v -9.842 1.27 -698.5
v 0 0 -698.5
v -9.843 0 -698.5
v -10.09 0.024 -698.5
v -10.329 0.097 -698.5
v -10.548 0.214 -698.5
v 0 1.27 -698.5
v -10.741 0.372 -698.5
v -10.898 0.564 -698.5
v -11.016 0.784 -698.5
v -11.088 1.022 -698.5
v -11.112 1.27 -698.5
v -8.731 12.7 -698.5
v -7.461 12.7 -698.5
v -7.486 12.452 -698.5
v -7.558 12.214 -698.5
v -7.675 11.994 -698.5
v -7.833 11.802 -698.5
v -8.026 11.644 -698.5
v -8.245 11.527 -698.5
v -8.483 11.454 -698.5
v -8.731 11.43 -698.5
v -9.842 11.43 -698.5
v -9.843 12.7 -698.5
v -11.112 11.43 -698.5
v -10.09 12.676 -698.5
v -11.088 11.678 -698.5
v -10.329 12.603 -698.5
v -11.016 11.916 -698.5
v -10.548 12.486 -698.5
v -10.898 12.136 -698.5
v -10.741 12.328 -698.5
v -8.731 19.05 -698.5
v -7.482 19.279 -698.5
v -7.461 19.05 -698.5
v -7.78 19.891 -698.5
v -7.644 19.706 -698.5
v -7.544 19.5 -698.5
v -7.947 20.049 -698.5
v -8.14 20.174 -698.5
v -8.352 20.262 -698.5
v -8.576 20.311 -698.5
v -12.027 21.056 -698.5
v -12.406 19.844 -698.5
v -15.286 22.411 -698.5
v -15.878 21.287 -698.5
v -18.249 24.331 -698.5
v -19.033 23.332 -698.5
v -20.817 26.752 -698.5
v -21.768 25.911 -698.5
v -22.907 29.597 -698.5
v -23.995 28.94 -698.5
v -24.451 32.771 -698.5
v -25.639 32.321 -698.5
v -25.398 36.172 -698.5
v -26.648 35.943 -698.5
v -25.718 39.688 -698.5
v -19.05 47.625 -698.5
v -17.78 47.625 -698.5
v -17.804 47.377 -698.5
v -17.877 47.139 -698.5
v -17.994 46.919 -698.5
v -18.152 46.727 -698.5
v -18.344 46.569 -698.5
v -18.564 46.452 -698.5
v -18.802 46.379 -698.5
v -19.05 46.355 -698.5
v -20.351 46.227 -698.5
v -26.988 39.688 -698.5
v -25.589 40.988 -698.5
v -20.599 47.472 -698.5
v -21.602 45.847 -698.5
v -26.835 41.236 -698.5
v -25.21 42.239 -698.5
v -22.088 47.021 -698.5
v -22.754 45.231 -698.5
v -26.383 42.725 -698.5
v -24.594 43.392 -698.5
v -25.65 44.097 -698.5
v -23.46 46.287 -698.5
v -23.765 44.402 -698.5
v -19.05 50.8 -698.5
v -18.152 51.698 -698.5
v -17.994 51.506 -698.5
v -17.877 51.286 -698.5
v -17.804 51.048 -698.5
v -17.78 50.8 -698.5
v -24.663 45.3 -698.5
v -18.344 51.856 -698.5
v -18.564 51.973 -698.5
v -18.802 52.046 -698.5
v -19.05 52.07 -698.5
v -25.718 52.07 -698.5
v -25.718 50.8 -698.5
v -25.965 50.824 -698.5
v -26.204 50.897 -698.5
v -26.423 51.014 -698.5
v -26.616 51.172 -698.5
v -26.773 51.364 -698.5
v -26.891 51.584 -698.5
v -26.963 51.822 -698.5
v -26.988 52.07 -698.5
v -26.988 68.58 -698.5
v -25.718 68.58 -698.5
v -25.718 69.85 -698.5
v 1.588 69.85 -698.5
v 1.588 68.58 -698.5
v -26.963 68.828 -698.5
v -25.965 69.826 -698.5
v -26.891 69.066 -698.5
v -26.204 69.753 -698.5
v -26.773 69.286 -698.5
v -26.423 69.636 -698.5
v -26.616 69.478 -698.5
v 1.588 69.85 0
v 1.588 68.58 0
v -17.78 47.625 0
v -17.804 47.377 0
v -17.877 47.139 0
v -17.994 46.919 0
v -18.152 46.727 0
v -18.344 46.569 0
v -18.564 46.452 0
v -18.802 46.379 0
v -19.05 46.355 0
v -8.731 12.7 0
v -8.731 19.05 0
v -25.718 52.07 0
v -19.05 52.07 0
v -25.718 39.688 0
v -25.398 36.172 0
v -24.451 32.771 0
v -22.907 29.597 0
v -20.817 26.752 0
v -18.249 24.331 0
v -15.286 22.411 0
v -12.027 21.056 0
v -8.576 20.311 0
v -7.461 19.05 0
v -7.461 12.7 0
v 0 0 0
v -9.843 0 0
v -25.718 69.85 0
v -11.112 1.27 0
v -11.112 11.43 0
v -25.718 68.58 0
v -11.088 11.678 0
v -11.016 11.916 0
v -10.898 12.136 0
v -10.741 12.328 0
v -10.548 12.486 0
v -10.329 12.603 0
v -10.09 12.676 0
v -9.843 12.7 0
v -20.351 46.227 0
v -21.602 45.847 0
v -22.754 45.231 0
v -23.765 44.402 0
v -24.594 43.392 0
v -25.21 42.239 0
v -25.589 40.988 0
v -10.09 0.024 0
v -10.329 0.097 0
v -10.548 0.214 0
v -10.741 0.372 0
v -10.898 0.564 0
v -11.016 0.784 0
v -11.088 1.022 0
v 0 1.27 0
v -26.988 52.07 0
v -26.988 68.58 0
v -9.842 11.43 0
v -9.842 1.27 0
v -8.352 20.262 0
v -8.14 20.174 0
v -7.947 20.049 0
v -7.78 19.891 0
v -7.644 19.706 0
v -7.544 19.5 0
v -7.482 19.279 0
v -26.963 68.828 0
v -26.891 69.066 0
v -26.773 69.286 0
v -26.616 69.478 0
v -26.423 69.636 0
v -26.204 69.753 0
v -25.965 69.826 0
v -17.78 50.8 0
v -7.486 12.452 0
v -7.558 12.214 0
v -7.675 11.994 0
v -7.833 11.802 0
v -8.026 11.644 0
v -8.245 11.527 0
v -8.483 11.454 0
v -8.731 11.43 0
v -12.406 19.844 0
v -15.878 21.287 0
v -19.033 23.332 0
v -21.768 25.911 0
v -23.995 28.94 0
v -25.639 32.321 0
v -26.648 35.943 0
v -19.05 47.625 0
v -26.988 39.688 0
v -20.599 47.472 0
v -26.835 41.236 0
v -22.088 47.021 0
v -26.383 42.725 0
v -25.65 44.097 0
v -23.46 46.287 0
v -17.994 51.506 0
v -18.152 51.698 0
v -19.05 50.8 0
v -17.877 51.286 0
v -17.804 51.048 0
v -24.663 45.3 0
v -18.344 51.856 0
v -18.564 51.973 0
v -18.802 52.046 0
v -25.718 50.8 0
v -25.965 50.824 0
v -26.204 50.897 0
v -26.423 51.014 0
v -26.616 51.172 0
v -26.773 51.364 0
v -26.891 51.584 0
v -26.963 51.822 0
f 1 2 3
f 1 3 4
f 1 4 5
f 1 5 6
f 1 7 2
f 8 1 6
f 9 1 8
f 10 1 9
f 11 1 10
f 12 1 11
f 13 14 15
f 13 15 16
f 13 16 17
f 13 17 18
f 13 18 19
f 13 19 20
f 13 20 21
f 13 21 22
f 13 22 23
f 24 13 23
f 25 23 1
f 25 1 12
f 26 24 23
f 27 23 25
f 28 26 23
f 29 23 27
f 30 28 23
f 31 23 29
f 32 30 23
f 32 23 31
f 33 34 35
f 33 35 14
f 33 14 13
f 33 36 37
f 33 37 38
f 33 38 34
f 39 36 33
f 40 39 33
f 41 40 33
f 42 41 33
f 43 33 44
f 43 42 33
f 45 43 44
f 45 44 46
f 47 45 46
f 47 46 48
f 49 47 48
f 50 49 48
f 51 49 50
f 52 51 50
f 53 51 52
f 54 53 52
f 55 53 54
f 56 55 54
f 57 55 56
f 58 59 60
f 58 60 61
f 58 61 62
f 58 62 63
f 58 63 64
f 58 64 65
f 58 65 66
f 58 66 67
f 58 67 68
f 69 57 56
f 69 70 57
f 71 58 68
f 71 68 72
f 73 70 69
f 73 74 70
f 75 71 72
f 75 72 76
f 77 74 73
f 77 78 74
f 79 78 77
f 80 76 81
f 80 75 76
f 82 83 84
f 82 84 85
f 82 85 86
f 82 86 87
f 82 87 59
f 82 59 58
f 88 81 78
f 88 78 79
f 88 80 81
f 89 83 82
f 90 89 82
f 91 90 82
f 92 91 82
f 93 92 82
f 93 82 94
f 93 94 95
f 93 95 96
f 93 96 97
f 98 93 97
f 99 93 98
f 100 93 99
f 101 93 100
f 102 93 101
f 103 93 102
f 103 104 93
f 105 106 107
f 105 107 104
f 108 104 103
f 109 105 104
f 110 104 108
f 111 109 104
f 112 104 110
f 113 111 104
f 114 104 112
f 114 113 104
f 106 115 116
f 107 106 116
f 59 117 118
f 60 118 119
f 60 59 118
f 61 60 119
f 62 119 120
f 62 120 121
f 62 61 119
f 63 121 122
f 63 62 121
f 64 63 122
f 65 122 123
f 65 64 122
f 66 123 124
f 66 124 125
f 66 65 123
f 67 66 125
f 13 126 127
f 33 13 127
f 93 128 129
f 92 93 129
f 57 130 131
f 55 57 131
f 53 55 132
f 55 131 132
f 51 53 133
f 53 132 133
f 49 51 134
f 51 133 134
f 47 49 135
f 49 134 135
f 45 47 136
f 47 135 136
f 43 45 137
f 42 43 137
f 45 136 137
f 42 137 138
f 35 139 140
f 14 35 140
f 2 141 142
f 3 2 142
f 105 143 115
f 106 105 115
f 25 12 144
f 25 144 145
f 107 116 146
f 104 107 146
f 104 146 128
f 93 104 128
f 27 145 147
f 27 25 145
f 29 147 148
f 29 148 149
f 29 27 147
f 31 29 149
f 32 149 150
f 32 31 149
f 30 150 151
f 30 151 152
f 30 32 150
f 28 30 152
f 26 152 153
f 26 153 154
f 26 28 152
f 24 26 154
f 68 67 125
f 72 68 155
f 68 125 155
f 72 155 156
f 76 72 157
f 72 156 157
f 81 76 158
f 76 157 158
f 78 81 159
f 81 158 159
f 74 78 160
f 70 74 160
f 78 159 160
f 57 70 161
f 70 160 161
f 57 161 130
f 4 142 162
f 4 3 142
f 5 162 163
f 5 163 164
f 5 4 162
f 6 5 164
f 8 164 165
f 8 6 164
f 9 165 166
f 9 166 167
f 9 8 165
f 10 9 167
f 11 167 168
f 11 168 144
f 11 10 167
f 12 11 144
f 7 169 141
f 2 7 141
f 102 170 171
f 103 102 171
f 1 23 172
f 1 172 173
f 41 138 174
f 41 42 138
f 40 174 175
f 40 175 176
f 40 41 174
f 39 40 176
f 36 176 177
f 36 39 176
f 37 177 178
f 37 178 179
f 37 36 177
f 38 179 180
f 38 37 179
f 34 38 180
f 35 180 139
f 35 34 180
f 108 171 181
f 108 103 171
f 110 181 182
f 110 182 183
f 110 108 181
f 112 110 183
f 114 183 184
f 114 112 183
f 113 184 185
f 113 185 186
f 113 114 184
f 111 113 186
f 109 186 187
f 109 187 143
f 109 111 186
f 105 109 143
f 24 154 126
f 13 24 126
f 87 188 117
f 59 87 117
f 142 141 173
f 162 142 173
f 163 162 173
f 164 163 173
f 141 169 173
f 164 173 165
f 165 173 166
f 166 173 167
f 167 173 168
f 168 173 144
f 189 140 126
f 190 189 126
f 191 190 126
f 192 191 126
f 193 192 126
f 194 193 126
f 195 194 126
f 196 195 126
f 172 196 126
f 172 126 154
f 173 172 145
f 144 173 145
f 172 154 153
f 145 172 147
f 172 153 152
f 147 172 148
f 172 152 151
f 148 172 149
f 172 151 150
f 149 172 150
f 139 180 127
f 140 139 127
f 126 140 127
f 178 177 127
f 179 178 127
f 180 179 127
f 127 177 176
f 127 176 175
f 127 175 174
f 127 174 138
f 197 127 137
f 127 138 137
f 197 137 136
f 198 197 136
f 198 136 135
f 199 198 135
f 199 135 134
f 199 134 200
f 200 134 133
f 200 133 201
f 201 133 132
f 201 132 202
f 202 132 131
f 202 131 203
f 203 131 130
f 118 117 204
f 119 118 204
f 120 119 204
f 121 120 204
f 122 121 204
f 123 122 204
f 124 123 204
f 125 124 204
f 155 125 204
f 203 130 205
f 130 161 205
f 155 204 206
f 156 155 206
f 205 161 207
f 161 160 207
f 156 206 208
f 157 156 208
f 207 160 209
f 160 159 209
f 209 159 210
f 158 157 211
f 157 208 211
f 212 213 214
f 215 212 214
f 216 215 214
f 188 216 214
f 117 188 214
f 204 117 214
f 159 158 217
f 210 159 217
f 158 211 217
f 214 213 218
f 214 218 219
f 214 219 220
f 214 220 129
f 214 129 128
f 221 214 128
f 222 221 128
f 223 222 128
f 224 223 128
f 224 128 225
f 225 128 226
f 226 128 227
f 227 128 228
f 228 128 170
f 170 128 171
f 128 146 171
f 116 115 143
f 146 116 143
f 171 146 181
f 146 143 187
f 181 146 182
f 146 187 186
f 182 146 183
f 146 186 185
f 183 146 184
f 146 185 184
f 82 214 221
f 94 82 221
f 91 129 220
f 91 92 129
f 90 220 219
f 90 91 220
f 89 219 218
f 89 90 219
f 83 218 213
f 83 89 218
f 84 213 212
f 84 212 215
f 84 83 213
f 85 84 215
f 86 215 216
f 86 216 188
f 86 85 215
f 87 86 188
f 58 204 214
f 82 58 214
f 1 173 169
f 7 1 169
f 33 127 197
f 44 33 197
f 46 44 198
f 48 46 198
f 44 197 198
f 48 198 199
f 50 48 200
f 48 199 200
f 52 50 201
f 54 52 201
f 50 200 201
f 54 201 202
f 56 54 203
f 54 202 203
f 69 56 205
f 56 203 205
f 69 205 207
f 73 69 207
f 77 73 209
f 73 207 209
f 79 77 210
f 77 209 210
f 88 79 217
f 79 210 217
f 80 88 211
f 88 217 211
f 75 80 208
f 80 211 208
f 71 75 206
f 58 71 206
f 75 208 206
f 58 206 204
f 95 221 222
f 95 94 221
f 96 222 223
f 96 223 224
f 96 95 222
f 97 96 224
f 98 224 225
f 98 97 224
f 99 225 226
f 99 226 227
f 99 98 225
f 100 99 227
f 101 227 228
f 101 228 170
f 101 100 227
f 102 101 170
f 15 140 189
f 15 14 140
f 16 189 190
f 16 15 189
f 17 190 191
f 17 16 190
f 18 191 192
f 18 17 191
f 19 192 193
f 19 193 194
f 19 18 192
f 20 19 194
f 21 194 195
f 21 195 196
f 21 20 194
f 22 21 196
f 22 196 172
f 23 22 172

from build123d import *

# Parameters (mm, degrees)
EXTRUDE_THIN1_DEPTH = 698.5
FILLET2_R           = 1.27


with BuildPart() as part:
    # Sketch1 → Extrude-Thin1 (new body)
    with BuildSketch(Plane.XY):
        with BuildLine():
            Line((0, 0), (-11.1125, 0))
            Line((-11.1125, 0), (-11.1125, 12.7))
            Line((-11.1125, 12.7), (-8.73125, 12.7))
            Line((-8.73125, 12.7), (-8.73125, 19.05))
            ThreePointArc((-8.73125, 19.05), (-21.768435997, 25.910734502), (-26.9875, 39.6875))
            ThreePointArc((-26.9875, 39.6875), (-24.662660076, 45.300160076), (-19.05, 47.625))
            Line((-19.05, 47.625), (-19.05, 50.8))
            Line((-19.05, 50.8), (-26.9875, 50.8))
            Line((-26.9875, 50.8), (-26.9875, 69.85))
            Line((-26.9875, 69.85), (1.5875, 69.85))
            Line((1.5875, 69.85), (1.5875, 68.58))
            Line((1.5875, 68.58), (-25.7175, 68.58))
            Line((-25.7175, 68.58), (-25.7175, 52.07))
            Line((-25.7175, 52.07), (-17.78, 52.07))
            Line((-17.78, 52.07), (-17.78, 46.232930181))
            ThreePointArc((-17.78, 46.232930181), (-23.291923576, 44.831587929), (-25.7175, 39.6875))
            ThreePointArc((-25.7175, 39.6875), (-20.440161015, 26.338097436), (-7.46125, 20.205828325))
            Line((-7.46125, 20.205828325), (-7.46125, 11.43))
            Line((-7.46125, 11.43), (-9.8425, 11.43))
            Line((-9.8425, 11.43), (-9.8425, 1.27))
            Line((-9.8425, 1.27), (0, 1.27))
            Line((0, 1.27), (0, 0))
        make_face()
    extrude(amount=-EXTRUDE_THIN1_DEPTH)

    # Fillet2
    fillet2_edges = [part.edges().sort_by_distance(p)[0] for p in [
        (-17.78, 52.07, -349.25),
        (-17.78, 46.232930181, -349.25),
        (-7.46125, 20.205828325, -349.25),
        (-7.46125, 11.43, -349.25),
        (-11.1125, 0, -349.25),
        (-11.1125, 12.7, -349.25),
        (-26.9875, 50.8, -349.25),
        (-26.9875, 69.85, -349.25),
    ]]
    fillet(fillet2_edges, radius=FILLET2_R)


solid = part.part
